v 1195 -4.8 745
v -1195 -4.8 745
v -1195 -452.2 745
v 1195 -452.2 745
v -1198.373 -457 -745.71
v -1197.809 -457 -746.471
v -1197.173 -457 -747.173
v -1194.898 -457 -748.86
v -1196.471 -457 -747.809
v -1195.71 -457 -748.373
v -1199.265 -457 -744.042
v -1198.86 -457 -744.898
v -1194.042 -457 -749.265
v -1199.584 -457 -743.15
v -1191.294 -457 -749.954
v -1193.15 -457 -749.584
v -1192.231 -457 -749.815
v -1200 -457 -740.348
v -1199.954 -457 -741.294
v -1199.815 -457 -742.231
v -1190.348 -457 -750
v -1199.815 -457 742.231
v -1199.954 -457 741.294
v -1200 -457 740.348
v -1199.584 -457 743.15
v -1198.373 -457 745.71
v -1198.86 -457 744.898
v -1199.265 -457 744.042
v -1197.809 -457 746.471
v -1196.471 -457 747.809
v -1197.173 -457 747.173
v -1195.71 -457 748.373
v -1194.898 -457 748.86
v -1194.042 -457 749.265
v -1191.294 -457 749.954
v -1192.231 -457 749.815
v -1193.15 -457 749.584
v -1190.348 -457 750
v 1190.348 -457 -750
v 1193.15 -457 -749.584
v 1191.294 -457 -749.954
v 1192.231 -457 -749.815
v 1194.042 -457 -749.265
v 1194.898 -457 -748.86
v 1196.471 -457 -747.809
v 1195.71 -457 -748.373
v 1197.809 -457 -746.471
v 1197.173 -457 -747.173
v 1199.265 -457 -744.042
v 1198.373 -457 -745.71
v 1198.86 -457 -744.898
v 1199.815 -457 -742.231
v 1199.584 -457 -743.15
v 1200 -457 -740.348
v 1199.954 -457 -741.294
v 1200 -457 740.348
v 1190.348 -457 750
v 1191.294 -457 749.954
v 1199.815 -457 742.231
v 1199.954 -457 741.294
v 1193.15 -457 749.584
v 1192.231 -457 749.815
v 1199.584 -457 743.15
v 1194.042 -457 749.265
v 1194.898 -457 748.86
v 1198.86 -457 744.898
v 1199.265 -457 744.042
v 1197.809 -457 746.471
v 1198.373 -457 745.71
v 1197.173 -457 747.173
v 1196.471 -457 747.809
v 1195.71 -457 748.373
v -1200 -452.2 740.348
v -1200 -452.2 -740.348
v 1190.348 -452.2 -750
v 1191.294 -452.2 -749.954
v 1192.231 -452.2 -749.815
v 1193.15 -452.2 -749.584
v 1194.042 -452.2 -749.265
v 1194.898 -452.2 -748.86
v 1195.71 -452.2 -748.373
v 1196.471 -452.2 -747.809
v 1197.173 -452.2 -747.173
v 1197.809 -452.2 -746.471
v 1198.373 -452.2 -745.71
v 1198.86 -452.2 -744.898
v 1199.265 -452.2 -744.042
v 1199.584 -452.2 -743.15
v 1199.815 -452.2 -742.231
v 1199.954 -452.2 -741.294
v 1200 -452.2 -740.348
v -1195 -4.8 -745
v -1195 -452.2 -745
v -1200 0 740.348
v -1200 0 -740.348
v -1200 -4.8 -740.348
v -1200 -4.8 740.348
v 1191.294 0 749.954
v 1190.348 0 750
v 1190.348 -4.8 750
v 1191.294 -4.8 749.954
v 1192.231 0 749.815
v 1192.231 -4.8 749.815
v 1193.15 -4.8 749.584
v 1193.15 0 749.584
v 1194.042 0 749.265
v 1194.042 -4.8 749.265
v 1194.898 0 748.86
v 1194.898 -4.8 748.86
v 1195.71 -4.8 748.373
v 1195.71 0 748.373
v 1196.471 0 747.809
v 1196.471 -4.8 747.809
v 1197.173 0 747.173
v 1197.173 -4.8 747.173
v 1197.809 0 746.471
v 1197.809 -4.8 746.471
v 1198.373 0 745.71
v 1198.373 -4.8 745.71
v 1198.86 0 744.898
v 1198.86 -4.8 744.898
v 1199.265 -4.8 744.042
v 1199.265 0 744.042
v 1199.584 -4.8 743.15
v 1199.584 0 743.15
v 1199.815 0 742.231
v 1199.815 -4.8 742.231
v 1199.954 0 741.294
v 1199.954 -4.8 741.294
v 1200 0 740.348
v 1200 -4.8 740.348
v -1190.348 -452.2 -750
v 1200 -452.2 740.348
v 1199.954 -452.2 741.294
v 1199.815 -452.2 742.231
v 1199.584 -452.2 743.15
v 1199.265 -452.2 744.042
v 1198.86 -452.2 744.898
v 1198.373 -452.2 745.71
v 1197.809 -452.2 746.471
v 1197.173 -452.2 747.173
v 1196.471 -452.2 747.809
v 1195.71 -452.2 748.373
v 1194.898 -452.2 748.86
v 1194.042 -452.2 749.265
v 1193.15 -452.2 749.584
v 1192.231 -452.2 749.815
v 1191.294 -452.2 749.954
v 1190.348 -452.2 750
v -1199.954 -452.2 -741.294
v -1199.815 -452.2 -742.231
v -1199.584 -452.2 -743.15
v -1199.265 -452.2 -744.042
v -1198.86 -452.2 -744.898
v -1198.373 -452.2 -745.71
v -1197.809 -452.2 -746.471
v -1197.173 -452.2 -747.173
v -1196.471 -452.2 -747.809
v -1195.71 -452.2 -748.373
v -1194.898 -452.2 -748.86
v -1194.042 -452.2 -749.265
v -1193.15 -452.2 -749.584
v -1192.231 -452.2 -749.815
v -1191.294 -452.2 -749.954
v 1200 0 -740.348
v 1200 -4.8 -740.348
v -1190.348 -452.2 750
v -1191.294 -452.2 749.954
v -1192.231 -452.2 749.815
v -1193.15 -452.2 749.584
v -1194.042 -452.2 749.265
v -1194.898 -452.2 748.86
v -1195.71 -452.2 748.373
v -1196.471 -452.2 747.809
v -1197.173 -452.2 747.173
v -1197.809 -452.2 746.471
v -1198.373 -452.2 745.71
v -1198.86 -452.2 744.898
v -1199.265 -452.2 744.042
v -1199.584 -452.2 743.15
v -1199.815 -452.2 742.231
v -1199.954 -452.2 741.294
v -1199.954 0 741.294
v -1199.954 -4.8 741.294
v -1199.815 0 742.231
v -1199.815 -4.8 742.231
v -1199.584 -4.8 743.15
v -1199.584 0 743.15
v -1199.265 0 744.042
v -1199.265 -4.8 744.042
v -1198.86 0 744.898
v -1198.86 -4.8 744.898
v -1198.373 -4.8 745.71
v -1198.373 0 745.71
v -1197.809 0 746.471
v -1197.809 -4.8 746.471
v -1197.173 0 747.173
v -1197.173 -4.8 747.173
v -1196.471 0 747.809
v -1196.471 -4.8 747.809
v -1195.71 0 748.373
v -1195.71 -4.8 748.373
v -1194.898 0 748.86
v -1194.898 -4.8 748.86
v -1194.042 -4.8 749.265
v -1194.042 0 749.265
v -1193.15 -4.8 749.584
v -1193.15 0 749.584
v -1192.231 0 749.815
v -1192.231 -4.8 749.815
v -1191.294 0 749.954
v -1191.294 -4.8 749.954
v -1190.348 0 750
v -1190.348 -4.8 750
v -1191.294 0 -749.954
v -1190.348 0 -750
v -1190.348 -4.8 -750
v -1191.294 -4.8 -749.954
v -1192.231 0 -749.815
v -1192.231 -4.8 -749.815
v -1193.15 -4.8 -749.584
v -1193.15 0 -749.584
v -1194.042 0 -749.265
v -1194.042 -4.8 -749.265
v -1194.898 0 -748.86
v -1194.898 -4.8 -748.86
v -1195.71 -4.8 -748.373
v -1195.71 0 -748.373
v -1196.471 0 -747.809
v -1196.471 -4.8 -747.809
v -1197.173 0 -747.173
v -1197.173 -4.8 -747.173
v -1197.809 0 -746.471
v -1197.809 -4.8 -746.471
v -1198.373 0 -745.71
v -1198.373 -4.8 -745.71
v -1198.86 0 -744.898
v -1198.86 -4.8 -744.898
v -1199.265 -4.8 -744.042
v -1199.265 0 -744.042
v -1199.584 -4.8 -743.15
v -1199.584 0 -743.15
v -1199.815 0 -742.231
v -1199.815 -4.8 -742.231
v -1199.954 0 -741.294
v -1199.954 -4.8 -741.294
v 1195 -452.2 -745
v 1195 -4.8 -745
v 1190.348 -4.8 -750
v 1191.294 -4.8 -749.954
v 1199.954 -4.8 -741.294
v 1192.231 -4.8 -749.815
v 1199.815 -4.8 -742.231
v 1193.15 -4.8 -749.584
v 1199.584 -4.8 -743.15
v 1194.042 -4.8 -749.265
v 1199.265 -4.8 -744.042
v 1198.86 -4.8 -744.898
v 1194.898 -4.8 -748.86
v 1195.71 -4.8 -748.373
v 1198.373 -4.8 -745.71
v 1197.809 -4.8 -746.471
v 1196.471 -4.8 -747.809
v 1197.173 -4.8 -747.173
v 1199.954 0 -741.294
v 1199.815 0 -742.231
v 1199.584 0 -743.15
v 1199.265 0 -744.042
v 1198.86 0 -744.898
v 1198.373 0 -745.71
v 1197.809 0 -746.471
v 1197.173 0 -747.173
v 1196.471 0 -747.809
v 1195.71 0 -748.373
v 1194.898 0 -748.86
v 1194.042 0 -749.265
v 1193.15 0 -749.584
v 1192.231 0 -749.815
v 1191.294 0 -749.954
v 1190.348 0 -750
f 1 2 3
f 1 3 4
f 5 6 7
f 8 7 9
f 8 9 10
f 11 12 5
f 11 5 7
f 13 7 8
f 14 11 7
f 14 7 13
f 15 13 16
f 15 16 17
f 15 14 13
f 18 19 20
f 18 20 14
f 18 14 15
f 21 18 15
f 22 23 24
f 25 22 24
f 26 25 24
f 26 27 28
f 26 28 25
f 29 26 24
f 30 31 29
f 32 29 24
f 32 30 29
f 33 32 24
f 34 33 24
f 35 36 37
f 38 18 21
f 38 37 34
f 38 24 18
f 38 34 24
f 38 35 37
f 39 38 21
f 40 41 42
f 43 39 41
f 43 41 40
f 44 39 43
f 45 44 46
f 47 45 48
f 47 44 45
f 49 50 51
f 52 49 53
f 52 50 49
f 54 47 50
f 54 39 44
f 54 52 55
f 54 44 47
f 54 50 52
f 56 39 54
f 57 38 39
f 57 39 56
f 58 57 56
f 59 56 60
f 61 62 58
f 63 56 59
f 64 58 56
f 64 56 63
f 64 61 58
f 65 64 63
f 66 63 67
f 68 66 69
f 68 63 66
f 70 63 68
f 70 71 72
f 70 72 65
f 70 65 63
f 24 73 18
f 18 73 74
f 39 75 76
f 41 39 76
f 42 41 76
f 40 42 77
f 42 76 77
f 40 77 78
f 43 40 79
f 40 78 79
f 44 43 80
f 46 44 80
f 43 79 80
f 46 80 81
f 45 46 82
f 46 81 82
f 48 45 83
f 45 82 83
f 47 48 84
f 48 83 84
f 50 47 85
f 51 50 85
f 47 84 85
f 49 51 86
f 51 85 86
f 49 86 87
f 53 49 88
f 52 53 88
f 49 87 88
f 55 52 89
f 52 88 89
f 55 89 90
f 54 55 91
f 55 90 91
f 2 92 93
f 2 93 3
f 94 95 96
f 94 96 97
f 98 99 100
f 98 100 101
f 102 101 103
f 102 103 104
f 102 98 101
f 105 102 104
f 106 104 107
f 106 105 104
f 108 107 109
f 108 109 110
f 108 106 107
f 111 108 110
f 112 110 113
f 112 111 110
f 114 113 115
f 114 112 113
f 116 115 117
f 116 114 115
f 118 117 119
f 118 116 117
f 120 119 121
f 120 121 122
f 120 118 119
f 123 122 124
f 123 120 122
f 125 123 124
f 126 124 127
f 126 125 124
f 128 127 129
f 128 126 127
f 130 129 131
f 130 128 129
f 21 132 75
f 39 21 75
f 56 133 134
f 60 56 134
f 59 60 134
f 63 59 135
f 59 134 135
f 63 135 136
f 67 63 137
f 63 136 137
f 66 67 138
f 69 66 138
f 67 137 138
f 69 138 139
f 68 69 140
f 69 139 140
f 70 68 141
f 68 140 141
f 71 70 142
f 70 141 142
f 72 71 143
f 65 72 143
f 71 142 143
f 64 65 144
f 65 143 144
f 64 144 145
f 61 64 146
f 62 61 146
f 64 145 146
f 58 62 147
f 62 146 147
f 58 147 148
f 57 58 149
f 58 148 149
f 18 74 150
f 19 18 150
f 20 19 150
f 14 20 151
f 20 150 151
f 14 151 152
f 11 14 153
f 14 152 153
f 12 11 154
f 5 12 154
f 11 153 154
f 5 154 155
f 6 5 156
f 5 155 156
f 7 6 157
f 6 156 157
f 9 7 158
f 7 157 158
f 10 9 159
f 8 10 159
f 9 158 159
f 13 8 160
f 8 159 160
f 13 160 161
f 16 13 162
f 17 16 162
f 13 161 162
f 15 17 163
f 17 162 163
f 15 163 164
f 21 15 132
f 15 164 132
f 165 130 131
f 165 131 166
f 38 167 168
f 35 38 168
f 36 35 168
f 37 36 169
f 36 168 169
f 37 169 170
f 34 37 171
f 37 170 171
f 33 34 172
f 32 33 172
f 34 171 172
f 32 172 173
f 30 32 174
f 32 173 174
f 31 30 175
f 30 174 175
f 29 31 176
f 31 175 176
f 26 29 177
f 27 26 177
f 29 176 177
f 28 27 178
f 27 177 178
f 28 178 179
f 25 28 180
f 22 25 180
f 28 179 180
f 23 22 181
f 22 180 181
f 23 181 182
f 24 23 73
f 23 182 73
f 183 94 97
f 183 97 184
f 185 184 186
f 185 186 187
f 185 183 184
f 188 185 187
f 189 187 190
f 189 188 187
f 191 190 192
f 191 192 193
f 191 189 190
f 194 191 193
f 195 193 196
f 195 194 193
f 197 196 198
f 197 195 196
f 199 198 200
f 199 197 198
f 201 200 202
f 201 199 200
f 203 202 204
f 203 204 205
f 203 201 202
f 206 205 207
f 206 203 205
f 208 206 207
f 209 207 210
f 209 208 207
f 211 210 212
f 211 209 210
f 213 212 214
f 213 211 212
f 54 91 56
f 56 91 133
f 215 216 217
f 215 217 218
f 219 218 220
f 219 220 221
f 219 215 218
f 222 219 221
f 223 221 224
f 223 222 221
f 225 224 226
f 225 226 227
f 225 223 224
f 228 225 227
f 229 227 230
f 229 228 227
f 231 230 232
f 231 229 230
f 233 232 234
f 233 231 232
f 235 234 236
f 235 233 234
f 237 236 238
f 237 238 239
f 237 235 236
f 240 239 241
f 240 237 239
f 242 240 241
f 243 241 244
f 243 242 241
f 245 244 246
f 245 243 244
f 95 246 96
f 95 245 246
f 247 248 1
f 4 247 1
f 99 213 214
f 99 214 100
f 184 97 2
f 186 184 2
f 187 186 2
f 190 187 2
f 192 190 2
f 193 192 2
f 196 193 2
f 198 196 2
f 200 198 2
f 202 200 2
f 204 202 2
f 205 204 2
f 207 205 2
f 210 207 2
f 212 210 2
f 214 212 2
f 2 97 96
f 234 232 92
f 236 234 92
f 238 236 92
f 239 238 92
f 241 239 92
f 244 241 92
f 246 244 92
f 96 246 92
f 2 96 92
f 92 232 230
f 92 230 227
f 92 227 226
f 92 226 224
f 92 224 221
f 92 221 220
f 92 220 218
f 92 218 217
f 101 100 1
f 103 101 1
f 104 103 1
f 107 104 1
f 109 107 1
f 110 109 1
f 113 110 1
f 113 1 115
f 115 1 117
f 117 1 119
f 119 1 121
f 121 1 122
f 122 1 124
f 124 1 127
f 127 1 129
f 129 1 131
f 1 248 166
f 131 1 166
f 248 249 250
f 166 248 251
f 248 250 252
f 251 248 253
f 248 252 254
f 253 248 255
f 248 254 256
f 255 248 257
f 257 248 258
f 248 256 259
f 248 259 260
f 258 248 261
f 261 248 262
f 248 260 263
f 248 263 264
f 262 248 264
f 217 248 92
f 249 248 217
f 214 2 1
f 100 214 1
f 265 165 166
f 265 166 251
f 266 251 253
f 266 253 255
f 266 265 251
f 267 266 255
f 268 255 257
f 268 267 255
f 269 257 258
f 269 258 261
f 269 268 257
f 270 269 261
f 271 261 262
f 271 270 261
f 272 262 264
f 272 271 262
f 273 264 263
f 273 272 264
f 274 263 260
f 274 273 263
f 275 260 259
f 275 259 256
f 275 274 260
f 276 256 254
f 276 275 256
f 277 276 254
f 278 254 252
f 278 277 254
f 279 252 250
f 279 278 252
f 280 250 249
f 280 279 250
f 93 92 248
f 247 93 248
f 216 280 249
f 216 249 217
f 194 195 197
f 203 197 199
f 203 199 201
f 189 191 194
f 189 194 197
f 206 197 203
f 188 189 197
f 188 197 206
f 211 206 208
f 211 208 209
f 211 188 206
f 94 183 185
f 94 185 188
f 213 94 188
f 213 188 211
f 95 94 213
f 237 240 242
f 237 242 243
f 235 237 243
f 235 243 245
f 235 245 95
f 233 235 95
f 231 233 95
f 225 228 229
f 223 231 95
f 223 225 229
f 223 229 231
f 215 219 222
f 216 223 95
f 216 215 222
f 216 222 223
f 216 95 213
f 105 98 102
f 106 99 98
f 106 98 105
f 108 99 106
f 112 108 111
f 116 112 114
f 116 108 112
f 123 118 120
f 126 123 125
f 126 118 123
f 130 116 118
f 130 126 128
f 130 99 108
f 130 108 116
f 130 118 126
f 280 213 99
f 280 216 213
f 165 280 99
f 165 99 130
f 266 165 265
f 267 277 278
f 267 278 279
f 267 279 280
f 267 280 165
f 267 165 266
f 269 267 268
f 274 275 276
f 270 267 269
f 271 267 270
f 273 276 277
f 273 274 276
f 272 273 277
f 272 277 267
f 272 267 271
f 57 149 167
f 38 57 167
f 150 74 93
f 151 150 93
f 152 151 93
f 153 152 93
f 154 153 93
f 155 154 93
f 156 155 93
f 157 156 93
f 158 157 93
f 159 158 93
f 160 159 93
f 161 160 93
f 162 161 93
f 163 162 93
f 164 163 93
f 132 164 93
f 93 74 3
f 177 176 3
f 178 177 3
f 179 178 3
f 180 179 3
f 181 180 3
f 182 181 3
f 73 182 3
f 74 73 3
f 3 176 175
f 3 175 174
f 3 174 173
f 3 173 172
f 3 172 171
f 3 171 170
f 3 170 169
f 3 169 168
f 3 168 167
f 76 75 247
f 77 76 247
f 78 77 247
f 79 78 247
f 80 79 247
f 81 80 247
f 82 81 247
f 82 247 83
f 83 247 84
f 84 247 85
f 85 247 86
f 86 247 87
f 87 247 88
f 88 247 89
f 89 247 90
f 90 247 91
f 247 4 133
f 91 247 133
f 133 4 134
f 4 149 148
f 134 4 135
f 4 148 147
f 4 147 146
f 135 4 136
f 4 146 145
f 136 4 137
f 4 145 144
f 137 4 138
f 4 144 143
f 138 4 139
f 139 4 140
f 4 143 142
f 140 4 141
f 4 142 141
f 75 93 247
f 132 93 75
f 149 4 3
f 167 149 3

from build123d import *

# Parameters (mm, degrees)
BOSS_EXTRUDE2_DEPTH = 4.8
SKETCH4_W           = 2390
SKETCH4_H           = 1490
BOSS_EXTRUDE3_DEPTH = 447.4
BOSS_EXTRUDE4_DEPTH = 4.8


with BuildPart() as part:
    # Sketch1 → Boss-Extrude2 (new body)
    with BuildSketch(Plane(origin=(0, 0, 0), x_dir=(1, 0, 0), z_dir=(0, 1, 0))):
        with BuildLine():
            Line((-1190.348, -750), (1190.348, -750))
            ThreePointArc((1190.348, -750), (1197.172994652, -747.172994652), (1200, -740.348))
            Line((1200, -740.348), (1200, 740.348))
            ThreePointArc((1200, 740.348), (1197.172994652, 747.172994652), (1190.348, 750))
            Line((1190.348, 750), (-1190.348, 750))
            ThreePointArc((-1190.348, 750), (-1197.172994652, 747.172994652), (-1200, 740.348))
            Line((-1200, 740.348), (-1200, -740.348))
            ThreePointArc((-1200, -740.348), (-1197.172994652, -747.172994652), (-1190.348, -750))
        make_face()
    extrude(amount=-BOSS_EXTRUDE2_DEPTH)

    # Sketch4 → Boss-Extrude3 (add)
    with BuildSketch(Plane.XZ.offset(4.8)):
        Rectangle(SKETCH4_W, SKETCH4_H)
    extrude(amount=BOSS_EXTRUDE3_DEPTH)

    # Sketch5 → Boss-Extrude4 (add)
    with BuildSketch(Plane.XZ.offset(452.2)):
        with BuildLine():
            Line((1190.348, 750), (-1190.348, 750))
            ThreePointArc((-1190.348, 750), (-1197.172994652, 747.172994652), (-1200, 740.348))
            Line((-1200, 740.348), (-1200, -740.348))
            ThreePointArc((-1200, -740.348), (-1197.172994652, -747.172994652), (-1190.348, -750))
            Line((-1190.348, -750), (1190.348, -750))
            ThreePointArc((1190.348, -750), (1197.172994652, -747.172994652), (1200, -740.348))
            Line((1200, -740.348), (1200, 740.348))
            ThreePointArc((1200, 740.348), (1197.172994652, 747.172994652), (1190.348, 750))
        make_face()
    extrude(amount=BOSS_EXTRUDE4_DEPTH)


solid = part.part
